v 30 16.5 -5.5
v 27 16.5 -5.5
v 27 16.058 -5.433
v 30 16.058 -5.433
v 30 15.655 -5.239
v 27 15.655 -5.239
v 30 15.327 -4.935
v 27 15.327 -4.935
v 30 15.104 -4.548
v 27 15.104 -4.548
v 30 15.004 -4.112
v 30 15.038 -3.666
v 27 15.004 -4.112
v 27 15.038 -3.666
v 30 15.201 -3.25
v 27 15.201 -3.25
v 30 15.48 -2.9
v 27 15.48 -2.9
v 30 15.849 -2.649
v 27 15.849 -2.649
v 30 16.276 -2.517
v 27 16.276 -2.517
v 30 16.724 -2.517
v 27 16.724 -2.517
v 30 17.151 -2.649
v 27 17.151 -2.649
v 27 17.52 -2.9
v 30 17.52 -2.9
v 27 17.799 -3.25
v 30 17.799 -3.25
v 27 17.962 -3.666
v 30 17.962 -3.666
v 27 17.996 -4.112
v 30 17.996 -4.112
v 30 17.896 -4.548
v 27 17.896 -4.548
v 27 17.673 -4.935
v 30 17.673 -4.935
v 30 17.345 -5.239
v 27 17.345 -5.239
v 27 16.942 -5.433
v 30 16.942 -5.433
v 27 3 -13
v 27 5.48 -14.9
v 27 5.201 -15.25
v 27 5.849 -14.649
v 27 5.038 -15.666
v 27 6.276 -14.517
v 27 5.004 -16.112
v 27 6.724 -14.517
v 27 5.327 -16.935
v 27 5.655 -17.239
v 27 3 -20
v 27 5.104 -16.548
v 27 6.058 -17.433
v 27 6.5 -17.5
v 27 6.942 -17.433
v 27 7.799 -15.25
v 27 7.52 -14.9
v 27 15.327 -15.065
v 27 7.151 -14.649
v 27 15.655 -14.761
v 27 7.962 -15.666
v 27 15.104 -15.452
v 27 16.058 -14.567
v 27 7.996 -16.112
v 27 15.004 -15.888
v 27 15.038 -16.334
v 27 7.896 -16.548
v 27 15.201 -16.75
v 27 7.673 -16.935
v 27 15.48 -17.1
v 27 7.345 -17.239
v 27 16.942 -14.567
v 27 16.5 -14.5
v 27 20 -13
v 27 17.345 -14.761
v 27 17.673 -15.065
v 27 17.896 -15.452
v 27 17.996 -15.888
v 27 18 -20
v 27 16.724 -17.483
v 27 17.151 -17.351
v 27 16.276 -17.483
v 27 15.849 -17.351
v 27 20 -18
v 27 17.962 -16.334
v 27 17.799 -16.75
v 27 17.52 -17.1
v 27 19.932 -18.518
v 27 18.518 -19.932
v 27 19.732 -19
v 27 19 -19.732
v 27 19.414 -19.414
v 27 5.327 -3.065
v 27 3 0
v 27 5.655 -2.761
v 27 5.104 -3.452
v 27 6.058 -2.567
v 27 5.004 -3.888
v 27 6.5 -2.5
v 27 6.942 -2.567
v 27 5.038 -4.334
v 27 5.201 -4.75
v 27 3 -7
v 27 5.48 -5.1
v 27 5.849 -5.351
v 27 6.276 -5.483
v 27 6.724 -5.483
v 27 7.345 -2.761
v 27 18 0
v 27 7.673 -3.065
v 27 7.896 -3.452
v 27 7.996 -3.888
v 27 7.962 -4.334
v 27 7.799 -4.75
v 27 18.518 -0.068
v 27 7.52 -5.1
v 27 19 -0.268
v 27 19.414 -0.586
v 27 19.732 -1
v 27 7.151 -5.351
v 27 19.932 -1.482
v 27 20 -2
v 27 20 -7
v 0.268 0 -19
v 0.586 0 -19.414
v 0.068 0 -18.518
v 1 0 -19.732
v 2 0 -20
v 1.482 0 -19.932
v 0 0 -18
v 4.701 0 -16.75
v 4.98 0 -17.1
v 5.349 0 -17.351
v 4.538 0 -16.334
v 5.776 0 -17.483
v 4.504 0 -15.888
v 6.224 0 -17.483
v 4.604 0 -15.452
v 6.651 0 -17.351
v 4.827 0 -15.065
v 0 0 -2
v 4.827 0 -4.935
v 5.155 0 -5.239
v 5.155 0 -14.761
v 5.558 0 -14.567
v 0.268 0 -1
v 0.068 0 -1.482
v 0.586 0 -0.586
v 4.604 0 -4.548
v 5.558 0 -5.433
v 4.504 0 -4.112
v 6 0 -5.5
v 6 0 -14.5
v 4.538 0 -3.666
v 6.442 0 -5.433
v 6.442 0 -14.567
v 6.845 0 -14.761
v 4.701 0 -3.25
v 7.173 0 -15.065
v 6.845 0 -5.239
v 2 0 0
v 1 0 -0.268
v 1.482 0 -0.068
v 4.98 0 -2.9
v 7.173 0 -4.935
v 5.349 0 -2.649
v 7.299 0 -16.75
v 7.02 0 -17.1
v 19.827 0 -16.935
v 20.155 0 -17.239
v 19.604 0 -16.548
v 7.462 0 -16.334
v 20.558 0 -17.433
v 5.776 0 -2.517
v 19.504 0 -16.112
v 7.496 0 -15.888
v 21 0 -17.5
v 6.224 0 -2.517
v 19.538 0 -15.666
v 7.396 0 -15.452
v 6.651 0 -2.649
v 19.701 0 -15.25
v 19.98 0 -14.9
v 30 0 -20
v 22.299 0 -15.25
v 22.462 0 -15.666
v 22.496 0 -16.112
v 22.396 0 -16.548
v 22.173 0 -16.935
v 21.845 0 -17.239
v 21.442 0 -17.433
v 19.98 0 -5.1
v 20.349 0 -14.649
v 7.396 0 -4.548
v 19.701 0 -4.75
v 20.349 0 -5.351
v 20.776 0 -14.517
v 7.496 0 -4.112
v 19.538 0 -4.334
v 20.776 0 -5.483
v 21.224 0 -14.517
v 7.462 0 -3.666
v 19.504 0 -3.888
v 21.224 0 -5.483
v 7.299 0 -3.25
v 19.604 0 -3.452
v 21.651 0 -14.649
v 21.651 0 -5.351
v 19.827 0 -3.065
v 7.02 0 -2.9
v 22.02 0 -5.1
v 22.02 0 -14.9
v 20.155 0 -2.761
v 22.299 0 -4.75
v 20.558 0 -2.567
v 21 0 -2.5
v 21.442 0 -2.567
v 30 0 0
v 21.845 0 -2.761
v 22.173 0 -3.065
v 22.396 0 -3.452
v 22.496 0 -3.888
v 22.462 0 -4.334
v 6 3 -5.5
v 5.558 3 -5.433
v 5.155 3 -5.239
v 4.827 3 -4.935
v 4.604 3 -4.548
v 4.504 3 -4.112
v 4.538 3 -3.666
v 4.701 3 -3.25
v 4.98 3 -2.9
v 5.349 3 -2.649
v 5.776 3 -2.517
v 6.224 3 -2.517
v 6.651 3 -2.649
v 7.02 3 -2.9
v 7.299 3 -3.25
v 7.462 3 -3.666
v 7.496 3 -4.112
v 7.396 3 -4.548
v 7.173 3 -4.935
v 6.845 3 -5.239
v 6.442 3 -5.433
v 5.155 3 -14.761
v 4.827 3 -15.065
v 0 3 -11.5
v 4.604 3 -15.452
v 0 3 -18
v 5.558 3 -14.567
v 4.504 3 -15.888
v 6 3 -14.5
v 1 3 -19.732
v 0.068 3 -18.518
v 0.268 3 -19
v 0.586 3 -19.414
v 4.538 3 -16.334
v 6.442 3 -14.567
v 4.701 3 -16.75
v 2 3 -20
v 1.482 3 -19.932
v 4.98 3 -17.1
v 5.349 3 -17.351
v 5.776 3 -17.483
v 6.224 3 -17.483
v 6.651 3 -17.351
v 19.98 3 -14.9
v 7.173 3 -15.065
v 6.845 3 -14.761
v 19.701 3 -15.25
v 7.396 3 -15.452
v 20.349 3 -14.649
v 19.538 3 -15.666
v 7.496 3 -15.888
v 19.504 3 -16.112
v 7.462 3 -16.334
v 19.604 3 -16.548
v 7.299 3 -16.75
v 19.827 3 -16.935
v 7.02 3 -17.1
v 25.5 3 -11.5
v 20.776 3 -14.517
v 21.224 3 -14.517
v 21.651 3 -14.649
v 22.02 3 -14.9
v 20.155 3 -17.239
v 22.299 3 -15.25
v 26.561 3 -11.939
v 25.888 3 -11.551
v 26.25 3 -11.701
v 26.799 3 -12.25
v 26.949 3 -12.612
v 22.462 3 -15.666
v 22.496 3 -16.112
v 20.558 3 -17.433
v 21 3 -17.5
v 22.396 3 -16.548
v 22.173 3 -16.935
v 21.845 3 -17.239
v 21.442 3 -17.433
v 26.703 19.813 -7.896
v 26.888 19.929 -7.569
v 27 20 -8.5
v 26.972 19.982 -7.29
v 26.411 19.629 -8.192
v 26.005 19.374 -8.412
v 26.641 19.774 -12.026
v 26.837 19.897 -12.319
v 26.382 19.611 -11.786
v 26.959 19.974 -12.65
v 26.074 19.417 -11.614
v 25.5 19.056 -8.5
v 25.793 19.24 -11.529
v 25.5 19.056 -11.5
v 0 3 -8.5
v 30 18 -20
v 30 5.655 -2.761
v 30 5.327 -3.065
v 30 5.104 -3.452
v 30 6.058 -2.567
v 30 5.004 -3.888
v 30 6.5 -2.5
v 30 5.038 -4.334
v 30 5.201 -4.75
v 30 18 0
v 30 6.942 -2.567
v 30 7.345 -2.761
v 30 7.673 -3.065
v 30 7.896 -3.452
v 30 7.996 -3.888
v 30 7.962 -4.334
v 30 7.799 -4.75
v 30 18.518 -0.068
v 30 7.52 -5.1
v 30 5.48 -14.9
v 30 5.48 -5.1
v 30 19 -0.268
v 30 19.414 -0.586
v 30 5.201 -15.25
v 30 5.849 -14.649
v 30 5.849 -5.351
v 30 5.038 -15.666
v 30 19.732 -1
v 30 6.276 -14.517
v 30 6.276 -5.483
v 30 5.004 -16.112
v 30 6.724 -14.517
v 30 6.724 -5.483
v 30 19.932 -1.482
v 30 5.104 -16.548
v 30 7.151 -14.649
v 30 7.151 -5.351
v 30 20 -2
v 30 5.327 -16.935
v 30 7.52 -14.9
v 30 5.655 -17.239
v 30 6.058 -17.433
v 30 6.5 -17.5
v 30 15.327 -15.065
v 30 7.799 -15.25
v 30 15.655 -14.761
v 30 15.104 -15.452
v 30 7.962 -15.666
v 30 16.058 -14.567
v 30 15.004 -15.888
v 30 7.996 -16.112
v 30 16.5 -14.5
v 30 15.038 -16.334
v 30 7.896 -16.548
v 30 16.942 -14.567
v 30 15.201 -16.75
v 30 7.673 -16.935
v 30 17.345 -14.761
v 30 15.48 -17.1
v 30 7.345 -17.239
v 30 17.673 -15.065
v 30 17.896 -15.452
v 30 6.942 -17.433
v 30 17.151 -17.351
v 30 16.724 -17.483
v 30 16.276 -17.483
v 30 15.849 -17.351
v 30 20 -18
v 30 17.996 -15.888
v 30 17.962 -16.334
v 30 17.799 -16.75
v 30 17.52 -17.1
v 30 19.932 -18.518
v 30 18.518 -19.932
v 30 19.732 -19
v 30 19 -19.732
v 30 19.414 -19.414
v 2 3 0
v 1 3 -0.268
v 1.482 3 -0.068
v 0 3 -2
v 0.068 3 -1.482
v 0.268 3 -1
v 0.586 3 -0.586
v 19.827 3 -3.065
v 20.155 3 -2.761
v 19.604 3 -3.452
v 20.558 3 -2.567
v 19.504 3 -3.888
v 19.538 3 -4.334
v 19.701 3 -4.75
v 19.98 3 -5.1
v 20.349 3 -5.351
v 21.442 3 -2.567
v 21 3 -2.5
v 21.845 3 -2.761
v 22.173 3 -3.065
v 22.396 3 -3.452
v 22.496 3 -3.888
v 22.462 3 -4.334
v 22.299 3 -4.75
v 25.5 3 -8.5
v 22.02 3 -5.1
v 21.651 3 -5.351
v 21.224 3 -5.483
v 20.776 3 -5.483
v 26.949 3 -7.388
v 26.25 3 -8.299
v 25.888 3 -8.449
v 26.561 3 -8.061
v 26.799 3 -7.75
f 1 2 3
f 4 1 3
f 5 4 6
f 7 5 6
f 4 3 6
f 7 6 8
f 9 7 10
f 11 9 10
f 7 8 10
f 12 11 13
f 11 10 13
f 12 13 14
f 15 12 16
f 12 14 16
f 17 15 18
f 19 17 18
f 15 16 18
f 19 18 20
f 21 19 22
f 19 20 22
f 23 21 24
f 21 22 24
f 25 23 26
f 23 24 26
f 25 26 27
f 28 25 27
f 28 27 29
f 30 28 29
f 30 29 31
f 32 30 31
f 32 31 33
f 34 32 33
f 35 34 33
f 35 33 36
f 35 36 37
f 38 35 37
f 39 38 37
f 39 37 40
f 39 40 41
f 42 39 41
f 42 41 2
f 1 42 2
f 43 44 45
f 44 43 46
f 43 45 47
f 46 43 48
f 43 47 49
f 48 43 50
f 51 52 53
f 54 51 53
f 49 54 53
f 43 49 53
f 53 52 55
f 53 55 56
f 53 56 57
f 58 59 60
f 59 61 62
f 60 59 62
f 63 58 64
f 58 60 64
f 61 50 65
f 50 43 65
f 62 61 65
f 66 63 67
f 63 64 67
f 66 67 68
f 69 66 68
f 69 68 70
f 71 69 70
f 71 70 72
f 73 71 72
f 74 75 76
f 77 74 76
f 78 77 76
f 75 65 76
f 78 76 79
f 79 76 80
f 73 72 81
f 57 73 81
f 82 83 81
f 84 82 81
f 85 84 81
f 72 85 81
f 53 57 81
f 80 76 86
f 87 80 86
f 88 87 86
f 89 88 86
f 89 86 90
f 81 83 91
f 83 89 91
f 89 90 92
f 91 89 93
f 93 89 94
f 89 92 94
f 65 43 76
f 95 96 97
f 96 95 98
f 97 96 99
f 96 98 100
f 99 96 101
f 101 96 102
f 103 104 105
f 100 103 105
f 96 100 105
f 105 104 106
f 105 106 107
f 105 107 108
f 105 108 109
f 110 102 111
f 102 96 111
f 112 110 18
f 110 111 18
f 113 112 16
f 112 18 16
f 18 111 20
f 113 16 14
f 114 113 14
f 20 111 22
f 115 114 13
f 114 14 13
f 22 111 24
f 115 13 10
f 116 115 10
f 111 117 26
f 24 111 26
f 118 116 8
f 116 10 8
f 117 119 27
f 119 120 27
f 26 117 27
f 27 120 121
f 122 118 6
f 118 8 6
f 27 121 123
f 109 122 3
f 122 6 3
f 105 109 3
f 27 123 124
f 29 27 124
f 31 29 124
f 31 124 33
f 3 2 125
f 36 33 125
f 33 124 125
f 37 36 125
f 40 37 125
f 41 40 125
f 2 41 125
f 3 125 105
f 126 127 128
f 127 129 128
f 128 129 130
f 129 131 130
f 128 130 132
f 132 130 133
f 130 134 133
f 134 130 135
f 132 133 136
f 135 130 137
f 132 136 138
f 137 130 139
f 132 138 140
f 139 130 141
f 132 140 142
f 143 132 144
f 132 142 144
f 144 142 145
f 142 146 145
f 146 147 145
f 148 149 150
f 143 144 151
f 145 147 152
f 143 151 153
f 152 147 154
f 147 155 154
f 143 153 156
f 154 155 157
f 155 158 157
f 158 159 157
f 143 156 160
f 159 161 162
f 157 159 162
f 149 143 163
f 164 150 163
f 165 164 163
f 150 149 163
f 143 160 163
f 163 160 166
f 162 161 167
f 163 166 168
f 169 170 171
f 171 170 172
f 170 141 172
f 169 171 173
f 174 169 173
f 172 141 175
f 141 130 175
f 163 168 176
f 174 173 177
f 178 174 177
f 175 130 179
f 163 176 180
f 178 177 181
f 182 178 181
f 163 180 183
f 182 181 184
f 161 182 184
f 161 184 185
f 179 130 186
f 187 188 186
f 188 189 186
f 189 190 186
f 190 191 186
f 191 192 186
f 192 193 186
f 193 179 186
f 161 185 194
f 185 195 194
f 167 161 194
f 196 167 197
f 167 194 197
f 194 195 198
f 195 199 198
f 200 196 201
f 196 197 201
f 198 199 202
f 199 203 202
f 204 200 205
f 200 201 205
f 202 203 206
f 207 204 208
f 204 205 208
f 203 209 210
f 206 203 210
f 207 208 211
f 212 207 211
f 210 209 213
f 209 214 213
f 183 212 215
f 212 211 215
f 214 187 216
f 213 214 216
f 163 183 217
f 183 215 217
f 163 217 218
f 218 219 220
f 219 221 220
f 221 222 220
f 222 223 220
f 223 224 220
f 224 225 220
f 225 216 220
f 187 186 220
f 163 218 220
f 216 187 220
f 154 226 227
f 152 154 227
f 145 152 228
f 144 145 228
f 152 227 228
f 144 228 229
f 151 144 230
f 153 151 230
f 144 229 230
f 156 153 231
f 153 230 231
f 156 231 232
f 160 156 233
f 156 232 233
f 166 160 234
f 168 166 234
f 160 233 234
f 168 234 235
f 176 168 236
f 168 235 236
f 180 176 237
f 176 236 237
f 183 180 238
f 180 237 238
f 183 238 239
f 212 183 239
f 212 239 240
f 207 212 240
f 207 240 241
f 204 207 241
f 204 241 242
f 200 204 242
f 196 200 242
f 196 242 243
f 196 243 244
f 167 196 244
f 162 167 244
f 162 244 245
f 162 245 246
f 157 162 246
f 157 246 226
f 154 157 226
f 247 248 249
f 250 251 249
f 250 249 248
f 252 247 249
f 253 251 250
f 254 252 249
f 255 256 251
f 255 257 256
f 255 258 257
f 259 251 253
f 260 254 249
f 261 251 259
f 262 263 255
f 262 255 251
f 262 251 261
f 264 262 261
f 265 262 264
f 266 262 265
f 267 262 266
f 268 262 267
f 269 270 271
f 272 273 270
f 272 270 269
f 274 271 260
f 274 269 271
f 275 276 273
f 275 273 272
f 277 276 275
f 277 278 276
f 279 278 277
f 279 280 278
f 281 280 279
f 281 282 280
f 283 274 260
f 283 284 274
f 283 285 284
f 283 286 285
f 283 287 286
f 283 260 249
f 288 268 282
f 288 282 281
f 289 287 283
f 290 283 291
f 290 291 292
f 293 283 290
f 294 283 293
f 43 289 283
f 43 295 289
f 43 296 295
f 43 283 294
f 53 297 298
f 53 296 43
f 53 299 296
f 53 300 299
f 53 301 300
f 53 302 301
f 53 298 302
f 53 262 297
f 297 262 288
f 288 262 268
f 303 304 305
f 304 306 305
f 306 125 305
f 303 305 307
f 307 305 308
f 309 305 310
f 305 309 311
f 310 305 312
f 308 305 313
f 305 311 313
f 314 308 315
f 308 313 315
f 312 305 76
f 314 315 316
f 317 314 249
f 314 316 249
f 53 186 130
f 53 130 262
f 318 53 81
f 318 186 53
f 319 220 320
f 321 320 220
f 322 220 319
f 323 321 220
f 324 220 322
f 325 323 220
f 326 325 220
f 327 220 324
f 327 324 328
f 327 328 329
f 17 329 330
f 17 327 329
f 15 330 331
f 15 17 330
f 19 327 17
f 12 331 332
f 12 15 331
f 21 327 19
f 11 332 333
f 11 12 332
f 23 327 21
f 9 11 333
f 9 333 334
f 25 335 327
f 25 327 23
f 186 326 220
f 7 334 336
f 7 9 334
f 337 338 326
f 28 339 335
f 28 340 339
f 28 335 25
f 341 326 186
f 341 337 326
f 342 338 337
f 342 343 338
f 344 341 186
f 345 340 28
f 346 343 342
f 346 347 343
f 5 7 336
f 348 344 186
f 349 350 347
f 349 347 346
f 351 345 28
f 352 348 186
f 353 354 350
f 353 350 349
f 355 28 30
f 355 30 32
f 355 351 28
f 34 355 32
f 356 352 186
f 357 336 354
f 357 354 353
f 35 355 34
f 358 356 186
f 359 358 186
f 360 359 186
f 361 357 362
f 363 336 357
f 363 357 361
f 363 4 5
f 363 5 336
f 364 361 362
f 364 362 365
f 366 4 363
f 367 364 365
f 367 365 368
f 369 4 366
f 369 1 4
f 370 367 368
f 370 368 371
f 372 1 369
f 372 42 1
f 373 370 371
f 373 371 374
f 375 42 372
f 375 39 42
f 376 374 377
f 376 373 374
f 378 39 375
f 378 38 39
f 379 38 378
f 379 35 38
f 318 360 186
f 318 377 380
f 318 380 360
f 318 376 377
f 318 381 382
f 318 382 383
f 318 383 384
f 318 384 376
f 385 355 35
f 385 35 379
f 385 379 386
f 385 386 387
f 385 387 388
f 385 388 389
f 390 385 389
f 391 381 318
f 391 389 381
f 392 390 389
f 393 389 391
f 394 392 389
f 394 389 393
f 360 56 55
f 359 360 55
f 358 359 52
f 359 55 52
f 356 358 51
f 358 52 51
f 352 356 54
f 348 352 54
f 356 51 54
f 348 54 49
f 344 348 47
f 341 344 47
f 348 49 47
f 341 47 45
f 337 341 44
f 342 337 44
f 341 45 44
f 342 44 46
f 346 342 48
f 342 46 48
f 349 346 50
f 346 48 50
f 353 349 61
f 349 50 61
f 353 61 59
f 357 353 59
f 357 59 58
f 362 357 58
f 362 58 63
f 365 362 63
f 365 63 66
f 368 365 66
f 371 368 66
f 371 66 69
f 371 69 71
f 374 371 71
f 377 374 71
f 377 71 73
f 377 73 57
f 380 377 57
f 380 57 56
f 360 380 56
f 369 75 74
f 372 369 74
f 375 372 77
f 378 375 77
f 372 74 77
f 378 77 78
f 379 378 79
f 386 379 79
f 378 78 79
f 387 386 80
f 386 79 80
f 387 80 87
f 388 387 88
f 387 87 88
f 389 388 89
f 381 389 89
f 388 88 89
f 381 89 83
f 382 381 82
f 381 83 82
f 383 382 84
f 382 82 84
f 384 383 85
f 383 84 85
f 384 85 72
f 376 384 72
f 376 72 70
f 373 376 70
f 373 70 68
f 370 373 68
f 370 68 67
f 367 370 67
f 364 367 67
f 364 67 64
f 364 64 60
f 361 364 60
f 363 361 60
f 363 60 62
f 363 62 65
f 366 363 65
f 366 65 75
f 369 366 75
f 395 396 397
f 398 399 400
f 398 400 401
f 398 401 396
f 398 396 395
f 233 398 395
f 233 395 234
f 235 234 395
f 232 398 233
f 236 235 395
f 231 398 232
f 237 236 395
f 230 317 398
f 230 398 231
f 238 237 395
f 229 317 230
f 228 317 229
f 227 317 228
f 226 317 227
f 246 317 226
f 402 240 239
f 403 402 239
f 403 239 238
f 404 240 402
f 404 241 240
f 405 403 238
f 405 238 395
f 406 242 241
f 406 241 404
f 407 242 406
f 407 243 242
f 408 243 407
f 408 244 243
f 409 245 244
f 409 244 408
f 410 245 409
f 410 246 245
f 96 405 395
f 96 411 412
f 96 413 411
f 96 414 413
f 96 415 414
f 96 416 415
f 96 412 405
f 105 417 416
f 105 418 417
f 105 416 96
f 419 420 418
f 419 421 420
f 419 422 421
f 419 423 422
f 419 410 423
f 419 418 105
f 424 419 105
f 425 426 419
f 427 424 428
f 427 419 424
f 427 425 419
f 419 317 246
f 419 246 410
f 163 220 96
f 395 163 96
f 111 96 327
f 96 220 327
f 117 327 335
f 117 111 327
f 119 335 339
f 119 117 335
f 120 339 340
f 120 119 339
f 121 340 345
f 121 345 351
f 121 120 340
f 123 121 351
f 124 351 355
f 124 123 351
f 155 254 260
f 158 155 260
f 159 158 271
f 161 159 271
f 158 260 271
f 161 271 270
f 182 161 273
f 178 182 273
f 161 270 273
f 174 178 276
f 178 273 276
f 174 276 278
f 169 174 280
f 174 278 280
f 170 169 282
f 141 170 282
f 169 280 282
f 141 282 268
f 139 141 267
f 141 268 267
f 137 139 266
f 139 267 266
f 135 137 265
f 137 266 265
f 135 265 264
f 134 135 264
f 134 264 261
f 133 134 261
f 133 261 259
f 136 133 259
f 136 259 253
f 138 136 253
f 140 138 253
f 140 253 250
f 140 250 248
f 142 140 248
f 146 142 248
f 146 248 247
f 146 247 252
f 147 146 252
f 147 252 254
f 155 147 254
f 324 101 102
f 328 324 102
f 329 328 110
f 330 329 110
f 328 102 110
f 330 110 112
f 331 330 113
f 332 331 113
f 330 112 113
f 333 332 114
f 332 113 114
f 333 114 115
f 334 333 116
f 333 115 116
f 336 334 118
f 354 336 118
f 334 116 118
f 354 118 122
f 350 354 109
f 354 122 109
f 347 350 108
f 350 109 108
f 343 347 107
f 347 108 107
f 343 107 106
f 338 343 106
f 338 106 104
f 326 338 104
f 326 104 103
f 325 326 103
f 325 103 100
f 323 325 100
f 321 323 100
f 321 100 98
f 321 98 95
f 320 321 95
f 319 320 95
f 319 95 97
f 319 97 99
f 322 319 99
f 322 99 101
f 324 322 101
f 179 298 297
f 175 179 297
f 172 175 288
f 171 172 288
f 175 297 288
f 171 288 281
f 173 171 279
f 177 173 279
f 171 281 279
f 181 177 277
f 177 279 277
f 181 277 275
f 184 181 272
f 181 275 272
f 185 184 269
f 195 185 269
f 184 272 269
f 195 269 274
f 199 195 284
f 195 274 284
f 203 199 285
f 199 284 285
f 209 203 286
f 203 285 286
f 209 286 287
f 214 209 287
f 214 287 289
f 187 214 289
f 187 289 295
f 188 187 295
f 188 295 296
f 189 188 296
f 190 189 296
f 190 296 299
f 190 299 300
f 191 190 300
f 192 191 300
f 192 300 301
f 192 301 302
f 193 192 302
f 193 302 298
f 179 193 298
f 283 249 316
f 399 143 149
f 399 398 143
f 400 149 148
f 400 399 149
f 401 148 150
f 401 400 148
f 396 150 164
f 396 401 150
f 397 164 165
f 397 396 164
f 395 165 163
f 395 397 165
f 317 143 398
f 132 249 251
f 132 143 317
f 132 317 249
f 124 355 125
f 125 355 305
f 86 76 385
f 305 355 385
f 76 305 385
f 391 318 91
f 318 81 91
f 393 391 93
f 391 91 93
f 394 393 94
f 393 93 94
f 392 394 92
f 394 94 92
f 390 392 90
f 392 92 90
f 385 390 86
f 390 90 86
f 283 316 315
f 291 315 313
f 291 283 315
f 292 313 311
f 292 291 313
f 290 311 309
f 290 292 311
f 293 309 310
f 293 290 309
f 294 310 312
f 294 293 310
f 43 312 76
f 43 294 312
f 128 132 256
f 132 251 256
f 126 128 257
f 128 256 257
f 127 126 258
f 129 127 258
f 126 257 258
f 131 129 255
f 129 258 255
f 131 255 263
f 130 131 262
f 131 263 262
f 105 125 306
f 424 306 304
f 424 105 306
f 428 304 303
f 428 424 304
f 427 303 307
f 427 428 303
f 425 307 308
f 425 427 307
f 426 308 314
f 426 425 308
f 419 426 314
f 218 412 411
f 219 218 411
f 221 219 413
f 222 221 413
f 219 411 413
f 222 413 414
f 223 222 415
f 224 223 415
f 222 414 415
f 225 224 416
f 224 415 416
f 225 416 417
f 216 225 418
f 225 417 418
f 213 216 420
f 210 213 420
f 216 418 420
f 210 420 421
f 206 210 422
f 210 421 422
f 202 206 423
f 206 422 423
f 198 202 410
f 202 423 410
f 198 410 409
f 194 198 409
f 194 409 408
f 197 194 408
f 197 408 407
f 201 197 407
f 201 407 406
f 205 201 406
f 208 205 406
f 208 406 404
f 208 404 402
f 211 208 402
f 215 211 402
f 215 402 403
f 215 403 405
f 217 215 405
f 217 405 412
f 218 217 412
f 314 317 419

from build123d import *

# Parameters (mm, degrees)
SKETCH_1_W           = 30
SKETCH_1_H           = 20
EXTRUDE_1_DEPTH      = 3
SKETCH_2_W           = 20
SKETCH_2_H           = 17
EXTRUDE_2_DEPTH      = 3
EXTRUDE_3_DEPTH      = 1.5
EXTRUDE_3_DEPTH_BACK = 1.5
SKETCH_4_R           = 1.5
CUT_EXTRUDE_1_DEPTH  = 40.862262856
SKETCH_5_R           = 1.5
CUT_EXTRUDE_2_DEPTH  = 40.102429592
FILLET_1_R           = 1.5
FILLET_2_R           = 2


with BuildPart() as part:
    # 草图1 → 凸台-拉伸1 (new body)
    with BuildSketch(Plane(origin=(0, 0, 0), x_dir=(1, 0, 0), z_dir=(0, 1, 0))):
        with Locations((15, 10)):
            Rectangle(SKETCH_1_W, SKETCH_1_H)
    extrude(amount=EXTRUDE_1_DEPTH)

    # 草图2 → 凸台-拉伸2 (add)
    with BuildSketch(Plane(origin=(30, 0, 0), x_dir=(0, 0, -1), z_dir=(1, 0, 0))):
        with Locations((10, 11.5)):
            Rectangle(SKETCH_2_W, SKETCH_2_H)
    extrude(amount=-EXTRUDE_2_DEPTH)

    # 草图3 → 凸台-拉伸3 (add, two sides: drawn at the far end of the back side and taken through both)
    with BuildSketch(Plane.XY.offset(-10).offset(-EXTRUDE_3_DEPTH_BACK)):
        Polygon((27, 20), (0, 3), (27, 3), align=None)
    extrude(amount=EXTRUDE_3_DEPTH + EXTRUDE_3_DEPTH_BACK)

    # 草图4 → 切除-拉伸1 (cut, through all)
    with BuildSketch(Plane(origin=(0, 3, 0), x_dir=(1, 0, 0), z_dir=(0, 1, 0))):
        with Locations(Location((6, 16, 0), (0, 0, 270))):
            Circle(SKETCH_4_R)
        with Locations(Location((21, 16, 0), (0, 0, 90))):
            Circle(SKETCH_4_R)
        with Locations(Location((21, 4, 0), (0, 0, 270))):
            Circle(SKETCH_4_R)
        with Locations(Location((6, 4, 0), (0, 0, 90))):
            Circle(SKETCH_4_R)
    extrude(amount=-CUT_EXTRUDE_1_DEPTH, mode=Mode.SUBTRACT)

    # 草图5 → 切除-拉伸2 (cut, through all)
    with BuildSketch(Plane.ZY.offset(-27)):
        with Locations((-16, 16.5)):
            Circle(SKETCH_5_R)
        with Locations(Location((-16, 6.5, 0), (0, 0, 180))):
            Circle(SKETCH_5_R)
        with Locations((-4, 6.5)):
            Circle(SKETCH_5_R)
        with Locations(Location((-4, 16.5, 0), (0, 0, 180))):
            Circle(SKETCH_5_R)
    extrude(amount=-CUT_EXTRUDE_2_DEPTH, mode=Mode.SUBTRACT)

    # 圆角1
    # the kernel refuses this fillet: 1.5 mm, written as the material it adds along each edge
    with BuildSketch(Plane(origin=(27, 3, -11.5), x_dir=(0, 0, -1), z_dir=(0, 1, 0))) as fillet_1_piece_1_section:
        with BuildLine():
            CenterArc((FILLET_1_R, FILLET_1_R), FILLET_1_R, 180, 90)
            Line((0, FILLET_1_R), (0, 0))
            Line((0, 0), (FILLET_1_R, 0))
        make_face()
    fillet_1_piece_1 = extrude(amount=20.75, mode=Mode.PRIVATE)
    fillet_1_piece_1 = split(fillet_1_piece_1, bisect_by=Plane(origin=(22.882537892, 17.407523858, -11.836797175), z_dir=(0.5328132696861393, -0.8462328400897506, 0)), keep=Keep.TOP, mode=Mode.PRIVATE)
    add(fillet_1_piece_1)
    with BuildSketch(Plane(origin=(27, -0.75, -8.5), x_dir=(0, 0, 1), z_dir=(0, 1, 0))) as fillet_1_piece_2_section:
        with BuildLine():
            CenterArc((FILLET_1_R, -FILLET_1_R), FILLET_1_R, 90, 90)
            Line((0, -FILLET_1_R), (0, 0))
            Line((0, 0), (FILLET_1_R, 0))
        make_face()
    fillet_1_piece_2 = extrude(amount=24.5, mode=Mode.PRIVATE)
    fillet_1_piece_2 = split(fillet_1_piece_2, bisect_by=Plane(origin=(26.667914796, 0, -8.163202825), z_dir=(0, 1, 0)), keep=Keep.TOP, mode=Mode.PRIVATE)
    fillet_1_piece_2 = split(fillet_1_piece_2, bisect_by=Plane(origin=(22.882537892, 17.407523858, -8.163202825), z_dir=(0.5328132696861393, -0.8462328400897506, 0)), keep=Keep.TOP, mode=Mode.PRIVATE)
    add(fillet_1_piece_2)

    # 圆角2
    fillet_2_edges = [part.edges().sort_by_distance(p)[0] for p in [
        (28.5, 20, 0),
        (28.5, 20, -20),
        (0, 1.5, -20),
        (0, 1.5, 0),
    ]]
    fillet(fillet_2_edges, radius=FILLET_2_R)


solid = part.part
